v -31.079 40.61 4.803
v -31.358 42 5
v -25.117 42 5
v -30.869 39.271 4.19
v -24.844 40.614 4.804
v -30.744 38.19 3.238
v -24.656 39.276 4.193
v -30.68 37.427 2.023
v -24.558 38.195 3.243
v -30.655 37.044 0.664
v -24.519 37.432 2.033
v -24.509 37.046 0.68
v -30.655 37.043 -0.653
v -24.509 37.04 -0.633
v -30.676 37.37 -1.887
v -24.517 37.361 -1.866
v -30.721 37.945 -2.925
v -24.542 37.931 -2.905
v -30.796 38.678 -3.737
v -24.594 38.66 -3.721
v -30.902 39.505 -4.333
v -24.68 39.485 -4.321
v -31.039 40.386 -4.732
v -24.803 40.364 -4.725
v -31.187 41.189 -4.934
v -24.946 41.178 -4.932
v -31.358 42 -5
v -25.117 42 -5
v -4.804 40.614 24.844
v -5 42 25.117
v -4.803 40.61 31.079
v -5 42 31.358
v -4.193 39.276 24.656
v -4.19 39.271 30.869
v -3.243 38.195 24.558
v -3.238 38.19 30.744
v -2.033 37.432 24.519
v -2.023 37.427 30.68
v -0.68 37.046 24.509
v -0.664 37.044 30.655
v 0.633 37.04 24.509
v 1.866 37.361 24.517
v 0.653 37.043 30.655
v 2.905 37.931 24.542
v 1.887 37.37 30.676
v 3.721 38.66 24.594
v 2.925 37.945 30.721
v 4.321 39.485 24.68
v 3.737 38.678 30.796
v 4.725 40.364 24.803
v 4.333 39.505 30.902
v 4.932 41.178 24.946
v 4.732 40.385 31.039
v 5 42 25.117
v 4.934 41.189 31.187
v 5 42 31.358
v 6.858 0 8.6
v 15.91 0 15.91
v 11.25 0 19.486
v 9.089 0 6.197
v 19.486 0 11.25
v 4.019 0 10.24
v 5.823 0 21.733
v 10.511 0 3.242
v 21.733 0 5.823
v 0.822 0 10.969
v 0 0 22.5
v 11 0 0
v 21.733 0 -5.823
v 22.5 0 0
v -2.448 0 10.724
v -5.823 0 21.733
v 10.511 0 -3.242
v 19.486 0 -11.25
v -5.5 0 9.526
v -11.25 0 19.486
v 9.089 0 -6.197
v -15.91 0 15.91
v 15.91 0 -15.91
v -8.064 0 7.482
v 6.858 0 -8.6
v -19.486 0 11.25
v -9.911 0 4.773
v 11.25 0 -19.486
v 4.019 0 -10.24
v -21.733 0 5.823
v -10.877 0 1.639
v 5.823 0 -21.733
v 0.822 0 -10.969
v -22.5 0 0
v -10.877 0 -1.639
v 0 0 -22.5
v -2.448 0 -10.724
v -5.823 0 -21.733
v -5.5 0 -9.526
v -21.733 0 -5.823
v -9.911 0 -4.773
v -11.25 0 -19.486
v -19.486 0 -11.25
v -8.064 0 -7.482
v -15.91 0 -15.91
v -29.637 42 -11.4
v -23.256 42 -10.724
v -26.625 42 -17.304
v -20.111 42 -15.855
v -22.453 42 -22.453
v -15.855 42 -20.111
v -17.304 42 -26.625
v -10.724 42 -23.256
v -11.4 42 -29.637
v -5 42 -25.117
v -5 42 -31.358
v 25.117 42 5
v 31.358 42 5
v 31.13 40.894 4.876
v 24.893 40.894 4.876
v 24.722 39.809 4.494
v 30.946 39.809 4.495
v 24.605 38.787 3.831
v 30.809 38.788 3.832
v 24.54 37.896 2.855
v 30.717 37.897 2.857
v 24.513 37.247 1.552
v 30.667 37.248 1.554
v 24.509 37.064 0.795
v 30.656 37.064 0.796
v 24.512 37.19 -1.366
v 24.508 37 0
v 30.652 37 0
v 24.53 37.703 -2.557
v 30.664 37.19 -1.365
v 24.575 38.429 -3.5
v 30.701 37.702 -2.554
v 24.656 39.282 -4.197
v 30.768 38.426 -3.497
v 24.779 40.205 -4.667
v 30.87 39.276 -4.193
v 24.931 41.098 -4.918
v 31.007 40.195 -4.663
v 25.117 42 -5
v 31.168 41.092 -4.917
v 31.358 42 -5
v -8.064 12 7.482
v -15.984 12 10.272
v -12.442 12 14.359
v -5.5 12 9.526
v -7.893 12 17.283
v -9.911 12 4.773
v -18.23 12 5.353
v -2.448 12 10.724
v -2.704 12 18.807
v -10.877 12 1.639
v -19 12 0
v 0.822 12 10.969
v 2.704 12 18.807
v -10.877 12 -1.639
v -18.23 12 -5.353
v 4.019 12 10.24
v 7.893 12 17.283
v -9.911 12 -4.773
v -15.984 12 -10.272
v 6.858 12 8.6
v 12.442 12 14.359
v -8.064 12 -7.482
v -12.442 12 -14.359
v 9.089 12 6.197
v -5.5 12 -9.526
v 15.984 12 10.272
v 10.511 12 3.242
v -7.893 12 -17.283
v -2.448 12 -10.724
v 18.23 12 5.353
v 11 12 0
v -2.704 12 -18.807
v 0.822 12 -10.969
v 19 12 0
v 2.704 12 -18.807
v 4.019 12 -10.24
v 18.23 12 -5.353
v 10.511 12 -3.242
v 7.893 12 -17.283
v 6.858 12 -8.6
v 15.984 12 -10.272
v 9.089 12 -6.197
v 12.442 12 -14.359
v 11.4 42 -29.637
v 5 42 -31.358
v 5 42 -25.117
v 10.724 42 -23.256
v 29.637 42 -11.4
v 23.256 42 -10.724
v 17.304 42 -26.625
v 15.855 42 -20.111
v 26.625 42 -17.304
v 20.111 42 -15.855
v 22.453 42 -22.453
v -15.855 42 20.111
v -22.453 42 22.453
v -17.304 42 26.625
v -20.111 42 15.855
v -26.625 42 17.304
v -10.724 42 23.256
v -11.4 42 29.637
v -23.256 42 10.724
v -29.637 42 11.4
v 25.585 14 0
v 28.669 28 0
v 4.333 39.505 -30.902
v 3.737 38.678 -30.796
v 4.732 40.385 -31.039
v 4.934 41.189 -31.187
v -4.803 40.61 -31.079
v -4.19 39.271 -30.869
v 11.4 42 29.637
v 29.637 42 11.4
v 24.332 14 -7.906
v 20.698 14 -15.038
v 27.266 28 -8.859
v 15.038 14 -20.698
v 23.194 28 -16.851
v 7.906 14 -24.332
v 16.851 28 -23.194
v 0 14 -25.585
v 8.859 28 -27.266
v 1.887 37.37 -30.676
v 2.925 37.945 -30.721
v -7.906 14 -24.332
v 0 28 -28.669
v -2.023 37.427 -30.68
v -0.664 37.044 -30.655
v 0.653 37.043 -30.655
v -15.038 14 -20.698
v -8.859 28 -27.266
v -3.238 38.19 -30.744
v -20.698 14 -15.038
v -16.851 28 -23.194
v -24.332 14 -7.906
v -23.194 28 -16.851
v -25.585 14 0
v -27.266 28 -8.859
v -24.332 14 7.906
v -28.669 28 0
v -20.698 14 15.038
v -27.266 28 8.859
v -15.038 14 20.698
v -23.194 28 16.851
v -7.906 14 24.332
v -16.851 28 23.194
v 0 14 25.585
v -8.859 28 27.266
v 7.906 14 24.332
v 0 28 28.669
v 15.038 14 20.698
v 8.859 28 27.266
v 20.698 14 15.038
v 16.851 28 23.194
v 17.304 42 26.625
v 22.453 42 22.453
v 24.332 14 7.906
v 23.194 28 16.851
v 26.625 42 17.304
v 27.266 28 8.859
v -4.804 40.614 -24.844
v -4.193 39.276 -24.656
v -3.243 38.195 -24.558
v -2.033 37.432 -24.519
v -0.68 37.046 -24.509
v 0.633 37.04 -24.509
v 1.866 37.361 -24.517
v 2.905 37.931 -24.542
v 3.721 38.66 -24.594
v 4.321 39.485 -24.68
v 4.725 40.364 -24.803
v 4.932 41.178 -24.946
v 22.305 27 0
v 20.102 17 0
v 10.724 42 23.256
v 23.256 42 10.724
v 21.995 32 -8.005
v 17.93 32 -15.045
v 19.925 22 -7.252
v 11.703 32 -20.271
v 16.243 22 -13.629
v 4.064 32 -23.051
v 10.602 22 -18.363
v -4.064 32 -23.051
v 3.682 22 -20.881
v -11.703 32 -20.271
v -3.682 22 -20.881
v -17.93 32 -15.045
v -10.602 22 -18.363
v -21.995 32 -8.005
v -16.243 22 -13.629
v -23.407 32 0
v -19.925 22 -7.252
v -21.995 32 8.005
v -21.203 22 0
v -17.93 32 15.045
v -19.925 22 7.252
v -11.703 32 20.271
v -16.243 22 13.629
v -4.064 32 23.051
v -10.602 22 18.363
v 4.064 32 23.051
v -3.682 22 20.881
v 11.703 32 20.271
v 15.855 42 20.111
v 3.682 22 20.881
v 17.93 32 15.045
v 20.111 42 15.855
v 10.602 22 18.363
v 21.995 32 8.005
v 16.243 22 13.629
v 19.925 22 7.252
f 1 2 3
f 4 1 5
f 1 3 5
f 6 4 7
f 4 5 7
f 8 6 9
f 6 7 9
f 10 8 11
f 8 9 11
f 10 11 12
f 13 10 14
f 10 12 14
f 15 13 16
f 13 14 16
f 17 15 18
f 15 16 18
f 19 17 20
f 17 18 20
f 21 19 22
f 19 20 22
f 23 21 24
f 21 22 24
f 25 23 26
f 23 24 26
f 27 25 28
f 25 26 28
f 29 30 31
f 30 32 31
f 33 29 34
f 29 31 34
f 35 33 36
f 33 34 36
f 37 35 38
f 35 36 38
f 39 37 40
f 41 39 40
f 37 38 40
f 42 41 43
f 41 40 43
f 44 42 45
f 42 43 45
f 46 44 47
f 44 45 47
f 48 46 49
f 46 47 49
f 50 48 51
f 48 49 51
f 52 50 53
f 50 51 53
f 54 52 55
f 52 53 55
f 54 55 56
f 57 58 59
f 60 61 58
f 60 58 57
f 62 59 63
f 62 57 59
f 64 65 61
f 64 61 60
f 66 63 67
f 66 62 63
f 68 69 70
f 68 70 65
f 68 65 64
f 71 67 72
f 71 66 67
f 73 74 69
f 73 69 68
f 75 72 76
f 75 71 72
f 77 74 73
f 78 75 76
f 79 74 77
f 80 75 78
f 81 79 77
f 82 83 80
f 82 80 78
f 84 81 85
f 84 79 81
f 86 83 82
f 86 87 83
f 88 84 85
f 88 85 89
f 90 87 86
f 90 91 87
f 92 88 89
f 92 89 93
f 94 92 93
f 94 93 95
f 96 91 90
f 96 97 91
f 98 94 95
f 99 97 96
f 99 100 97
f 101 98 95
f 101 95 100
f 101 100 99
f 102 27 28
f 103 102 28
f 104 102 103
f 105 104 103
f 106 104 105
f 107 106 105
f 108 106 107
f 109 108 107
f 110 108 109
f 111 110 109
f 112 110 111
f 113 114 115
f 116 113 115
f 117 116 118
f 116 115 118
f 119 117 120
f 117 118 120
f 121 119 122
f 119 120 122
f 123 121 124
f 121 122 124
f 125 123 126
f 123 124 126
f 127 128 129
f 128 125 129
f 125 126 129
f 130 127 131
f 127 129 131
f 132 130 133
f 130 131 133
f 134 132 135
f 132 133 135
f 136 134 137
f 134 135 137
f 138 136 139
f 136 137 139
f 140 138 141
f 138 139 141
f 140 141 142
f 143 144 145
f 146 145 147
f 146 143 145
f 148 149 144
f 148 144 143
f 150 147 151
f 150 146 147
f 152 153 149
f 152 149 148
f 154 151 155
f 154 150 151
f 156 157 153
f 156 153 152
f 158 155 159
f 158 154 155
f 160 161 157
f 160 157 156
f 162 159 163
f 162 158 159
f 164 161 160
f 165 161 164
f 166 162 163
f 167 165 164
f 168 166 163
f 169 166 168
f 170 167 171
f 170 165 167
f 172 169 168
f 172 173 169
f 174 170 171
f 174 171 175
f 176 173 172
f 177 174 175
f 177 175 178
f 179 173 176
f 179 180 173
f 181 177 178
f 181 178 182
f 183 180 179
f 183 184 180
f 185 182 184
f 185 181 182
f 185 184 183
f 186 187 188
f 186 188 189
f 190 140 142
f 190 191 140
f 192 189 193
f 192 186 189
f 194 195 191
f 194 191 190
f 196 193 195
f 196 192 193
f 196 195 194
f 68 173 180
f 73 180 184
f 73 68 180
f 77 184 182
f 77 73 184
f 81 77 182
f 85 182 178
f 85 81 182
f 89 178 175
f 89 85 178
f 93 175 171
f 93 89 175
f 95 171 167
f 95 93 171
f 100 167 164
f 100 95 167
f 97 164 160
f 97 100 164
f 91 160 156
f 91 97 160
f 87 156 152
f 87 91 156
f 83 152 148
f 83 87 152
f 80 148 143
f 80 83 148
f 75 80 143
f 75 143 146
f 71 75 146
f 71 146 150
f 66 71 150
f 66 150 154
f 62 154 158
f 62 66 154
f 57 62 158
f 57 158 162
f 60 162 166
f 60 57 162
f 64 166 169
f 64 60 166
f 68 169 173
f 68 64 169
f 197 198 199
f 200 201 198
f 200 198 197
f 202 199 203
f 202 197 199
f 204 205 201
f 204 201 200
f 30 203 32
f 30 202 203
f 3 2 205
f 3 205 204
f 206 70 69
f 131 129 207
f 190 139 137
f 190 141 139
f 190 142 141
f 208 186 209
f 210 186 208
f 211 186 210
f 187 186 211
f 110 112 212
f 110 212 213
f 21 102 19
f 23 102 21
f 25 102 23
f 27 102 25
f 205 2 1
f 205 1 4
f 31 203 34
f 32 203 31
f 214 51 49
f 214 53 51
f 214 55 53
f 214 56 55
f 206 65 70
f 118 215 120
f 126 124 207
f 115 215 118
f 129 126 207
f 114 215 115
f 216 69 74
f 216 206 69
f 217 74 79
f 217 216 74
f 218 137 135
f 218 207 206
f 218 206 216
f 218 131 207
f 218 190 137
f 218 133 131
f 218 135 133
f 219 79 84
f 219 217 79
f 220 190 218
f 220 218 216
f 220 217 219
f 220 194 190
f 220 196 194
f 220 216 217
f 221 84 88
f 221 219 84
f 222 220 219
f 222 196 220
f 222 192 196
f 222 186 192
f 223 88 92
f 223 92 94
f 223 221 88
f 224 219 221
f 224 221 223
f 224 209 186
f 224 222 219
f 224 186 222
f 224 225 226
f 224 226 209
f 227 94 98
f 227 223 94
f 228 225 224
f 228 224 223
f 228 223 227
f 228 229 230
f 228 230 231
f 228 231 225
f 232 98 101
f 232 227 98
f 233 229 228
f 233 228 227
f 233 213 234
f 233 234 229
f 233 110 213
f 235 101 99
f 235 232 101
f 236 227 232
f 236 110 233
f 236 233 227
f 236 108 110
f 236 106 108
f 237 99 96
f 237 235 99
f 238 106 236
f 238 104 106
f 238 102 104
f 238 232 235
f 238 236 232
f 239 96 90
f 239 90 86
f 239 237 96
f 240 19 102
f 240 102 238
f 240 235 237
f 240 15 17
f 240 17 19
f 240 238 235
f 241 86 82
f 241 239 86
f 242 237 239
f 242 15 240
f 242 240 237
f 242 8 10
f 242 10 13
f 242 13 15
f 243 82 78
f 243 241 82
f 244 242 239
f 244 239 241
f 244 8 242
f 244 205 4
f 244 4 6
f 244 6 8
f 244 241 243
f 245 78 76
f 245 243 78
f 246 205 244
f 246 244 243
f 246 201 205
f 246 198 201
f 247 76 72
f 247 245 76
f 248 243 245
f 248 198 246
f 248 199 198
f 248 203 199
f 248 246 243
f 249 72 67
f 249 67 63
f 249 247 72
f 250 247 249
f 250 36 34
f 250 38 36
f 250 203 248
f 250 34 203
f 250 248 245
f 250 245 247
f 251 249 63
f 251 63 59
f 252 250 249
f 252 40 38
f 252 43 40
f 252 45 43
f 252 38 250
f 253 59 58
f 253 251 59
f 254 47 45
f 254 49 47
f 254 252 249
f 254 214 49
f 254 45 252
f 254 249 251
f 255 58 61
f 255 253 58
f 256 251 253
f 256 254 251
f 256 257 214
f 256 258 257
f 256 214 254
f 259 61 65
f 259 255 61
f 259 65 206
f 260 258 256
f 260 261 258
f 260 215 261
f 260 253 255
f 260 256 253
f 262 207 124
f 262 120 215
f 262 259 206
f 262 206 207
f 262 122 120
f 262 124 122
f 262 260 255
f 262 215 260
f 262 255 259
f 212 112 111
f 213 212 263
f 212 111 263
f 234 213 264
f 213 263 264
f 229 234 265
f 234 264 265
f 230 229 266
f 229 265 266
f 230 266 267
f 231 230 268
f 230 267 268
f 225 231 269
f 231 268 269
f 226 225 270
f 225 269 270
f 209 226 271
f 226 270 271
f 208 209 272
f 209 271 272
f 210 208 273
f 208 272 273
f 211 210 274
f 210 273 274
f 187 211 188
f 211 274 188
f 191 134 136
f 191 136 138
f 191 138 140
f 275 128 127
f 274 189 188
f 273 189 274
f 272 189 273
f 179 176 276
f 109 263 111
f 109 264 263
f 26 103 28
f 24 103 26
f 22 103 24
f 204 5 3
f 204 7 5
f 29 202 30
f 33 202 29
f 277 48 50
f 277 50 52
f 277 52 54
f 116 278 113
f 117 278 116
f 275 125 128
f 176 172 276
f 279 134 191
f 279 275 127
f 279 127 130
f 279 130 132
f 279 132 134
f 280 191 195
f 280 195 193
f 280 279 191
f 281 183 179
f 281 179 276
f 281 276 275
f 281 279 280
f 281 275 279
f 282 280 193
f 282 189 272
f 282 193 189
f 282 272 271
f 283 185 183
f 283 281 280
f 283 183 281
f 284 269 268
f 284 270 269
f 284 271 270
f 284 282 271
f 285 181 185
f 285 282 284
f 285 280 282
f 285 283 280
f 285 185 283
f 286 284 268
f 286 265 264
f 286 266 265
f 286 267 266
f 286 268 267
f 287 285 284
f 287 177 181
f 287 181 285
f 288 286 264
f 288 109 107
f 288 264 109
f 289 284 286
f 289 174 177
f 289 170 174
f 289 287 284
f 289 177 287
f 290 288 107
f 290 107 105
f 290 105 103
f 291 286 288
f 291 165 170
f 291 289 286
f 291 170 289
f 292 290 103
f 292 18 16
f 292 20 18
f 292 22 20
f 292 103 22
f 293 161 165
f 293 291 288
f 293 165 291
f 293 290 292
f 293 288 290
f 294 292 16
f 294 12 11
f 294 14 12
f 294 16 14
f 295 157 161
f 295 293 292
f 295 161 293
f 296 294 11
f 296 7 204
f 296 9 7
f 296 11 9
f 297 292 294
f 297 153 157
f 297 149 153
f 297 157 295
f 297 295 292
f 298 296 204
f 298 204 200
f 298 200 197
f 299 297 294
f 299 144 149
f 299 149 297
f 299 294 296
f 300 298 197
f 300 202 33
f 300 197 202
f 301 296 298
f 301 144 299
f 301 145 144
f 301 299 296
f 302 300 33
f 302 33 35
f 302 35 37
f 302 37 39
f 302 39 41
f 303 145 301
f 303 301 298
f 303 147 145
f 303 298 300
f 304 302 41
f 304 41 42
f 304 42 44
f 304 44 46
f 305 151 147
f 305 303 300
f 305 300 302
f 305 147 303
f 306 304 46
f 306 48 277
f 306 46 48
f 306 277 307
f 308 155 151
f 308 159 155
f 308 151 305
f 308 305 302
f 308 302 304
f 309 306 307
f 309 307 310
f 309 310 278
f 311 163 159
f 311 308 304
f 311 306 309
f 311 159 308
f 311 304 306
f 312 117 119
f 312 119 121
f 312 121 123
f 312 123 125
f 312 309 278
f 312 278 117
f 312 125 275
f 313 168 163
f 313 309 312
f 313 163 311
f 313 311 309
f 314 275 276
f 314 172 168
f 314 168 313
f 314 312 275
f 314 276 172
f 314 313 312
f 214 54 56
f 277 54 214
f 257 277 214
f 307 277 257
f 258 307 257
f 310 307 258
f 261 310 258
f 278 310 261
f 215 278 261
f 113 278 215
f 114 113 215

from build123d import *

# Parameters (mm, degrees)
SKETCH2_R          = 5
CUT_EXTRUDE1_DEPTH = 35.5
CIRPATTERN1_COUNT  = 4


with BuildPart() as part:
    # Sketch1 → Revolve1 (revolve)
    with BuildSketch(Plane.XY):
        Polygon((11.880841121, 0), (22.5, 0), (31.753664233, 42), (25.609760166, 42), (19, 12), (11, 12), (11, 0), align=None)
    revolve(axis=Axis((0, 0, 0), (0, 1, 0)))

    # Sketch2 → Cut-Extrude1 (cut, symmetric)
    with BuildSketch(Plane.XY):
        with Locations((0, 42)):
            Circle(SKETCH2_R)
    cut_extrude1 = extrude(amount=CUT_EXTRUDE1_DEPTH, both=True, mode=Mode.SUBTRACT)

    # CirPattern1: Cut-Extrude1 ×4 about axis
    cirpattern1_axis = Axis((0, 0, 0), (0, 1, 0))
    for i in range(1, CIRPATTERN1_COUNT):
        add(cut_extrude1.rotate(cirpattern1_axis, i * 360 / CIRPATTERN1_COUNT), mode=Mode.SUBTRACT)


solid = part.part
